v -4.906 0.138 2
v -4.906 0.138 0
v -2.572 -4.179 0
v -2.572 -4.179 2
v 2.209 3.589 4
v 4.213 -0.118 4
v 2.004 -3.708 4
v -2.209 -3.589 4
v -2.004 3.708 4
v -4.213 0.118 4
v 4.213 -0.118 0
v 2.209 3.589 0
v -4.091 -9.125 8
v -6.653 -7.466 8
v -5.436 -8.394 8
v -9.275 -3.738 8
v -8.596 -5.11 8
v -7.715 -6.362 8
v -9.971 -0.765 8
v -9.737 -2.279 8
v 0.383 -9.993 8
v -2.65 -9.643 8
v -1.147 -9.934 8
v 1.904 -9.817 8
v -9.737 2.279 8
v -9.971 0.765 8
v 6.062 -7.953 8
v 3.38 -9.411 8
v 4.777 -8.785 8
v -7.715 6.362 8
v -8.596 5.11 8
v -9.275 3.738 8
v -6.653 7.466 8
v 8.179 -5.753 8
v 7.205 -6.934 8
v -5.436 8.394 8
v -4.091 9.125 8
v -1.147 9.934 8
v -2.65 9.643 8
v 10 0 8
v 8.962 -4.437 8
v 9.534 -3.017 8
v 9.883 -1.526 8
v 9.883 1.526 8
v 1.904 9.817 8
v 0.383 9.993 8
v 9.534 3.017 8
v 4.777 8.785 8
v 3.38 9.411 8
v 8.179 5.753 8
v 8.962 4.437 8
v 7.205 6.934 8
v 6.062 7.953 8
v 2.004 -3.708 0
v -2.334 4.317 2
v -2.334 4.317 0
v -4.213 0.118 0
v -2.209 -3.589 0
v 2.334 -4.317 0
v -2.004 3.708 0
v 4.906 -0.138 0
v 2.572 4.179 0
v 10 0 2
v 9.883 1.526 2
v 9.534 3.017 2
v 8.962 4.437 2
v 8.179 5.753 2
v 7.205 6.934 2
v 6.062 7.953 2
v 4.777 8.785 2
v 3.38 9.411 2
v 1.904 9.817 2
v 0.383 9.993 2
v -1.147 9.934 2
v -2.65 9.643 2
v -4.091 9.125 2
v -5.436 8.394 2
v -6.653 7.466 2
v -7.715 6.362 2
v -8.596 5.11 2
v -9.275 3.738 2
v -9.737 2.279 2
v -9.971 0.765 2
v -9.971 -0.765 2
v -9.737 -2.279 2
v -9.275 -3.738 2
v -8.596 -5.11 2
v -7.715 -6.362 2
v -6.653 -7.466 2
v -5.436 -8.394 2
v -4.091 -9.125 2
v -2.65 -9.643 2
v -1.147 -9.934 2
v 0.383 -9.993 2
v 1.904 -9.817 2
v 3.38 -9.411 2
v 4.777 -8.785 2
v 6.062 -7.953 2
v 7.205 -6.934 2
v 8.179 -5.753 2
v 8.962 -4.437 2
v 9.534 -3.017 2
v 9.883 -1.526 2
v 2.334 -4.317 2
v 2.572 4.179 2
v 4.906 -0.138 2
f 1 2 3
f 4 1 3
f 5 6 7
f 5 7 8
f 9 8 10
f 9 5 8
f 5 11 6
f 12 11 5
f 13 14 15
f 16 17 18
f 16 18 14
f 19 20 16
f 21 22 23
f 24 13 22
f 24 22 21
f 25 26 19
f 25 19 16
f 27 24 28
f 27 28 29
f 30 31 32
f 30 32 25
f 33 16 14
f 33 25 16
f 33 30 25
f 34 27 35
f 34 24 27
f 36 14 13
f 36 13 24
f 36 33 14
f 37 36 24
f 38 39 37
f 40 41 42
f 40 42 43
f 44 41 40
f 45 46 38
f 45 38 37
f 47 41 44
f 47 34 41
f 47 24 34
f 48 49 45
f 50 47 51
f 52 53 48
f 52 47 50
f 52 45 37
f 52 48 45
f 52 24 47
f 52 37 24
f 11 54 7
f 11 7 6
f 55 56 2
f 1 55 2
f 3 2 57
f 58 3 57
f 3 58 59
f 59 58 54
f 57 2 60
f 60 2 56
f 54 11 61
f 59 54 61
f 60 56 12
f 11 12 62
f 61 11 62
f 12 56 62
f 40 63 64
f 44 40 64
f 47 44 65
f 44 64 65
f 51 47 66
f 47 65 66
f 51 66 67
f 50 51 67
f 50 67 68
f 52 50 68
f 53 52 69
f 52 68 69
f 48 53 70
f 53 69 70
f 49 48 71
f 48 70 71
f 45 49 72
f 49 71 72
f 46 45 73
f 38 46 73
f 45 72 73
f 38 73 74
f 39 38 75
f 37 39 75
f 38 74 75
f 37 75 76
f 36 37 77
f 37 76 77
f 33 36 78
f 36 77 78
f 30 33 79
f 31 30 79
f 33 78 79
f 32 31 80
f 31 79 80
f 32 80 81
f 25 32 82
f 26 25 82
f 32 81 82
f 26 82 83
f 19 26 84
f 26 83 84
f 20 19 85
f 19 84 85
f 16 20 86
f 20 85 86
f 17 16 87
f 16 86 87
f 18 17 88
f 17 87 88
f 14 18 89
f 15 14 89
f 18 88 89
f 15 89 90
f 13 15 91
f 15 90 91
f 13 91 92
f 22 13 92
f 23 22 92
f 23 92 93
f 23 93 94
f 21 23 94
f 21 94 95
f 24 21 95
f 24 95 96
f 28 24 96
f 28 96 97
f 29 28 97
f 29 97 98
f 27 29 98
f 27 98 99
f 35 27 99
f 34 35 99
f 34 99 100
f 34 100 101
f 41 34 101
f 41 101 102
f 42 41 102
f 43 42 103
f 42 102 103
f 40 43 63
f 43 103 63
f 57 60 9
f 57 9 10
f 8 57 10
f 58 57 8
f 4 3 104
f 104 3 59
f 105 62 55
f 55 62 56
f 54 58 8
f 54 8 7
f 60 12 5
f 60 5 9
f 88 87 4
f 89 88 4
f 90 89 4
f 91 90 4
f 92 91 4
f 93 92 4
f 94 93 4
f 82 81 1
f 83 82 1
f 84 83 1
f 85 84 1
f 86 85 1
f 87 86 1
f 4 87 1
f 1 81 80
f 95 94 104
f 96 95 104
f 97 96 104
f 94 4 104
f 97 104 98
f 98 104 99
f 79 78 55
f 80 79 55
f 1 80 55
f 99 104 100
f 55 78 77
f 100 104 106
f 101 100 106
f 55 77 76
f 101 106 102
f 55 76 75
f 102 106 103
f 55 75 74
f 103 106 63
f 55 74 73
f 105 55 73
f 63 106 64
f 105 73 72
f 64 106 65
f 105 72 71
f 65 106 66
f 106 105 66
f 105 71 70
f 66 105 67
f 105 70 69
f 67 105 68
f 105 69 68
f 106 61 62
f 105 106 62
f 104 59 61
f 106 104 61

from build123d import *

# Parameters (mm, degrees)
BOSS_EXTRUDE1_DEPTH = 2
SKETCH2_R           = 10
BOSS_EXTRUDE2_DEPTH = 6
CUT_EXTRUDE1_DEPTH  = 2


with BuildPart() as part:
    # Sketch1 → Boss-Extrude1 (new body)
    with BuildSketch(Plane.XY):
        Polygon((-2.571996213, -4.179493846), (2.333549739, -4.317160982), (4.905545953, -0.137667136), (2.571996213, 4.179493846), (-2.333549739, 4.317160982), (-4.905545953, 0.137667136), align=None)
        Polygon((2.208890865, 3.589447656), (-2.004107423, 3.707679432), (-4.212998289, 0.118231775), (-2.208890865, -3.589447656), (2.004107423, -3.707679432), (4.212998289, -0.118231775), align=None, mode=Mode.SUBTRACT)
    extrude(amount=BOSS_EXTRUDE1_DEPTH)

    # Sketch2 → Boss-Extrude2 (add)
    with BuildSketch(Plane.XY.offset(2)):
        Circle(SKETCH2_R)
    extrude(amount=BOSS_EXTRUDE2_DEPTH)

    # Sketch5 → Cut-Extrude1 (cut)
    with BuildSketch(Plane(origin=(0, 0, 2), x_dir=(-1, 0, 0), z_dir=(0, 0, -1))):
        Polygon((-2.208890865, 3.589447656), (-4.212998289, -0.118231775), (-2.004107423, -3.707679432), (2.208890865, -3.589447656), (4.212998289, 0.118231775), (2.004107423, 3.707679432), align=None)
    extrude(amount=-CUT_EXTRUDE1_DEPTH, mode=Mode.SUBTRACT)


solid = part.part
